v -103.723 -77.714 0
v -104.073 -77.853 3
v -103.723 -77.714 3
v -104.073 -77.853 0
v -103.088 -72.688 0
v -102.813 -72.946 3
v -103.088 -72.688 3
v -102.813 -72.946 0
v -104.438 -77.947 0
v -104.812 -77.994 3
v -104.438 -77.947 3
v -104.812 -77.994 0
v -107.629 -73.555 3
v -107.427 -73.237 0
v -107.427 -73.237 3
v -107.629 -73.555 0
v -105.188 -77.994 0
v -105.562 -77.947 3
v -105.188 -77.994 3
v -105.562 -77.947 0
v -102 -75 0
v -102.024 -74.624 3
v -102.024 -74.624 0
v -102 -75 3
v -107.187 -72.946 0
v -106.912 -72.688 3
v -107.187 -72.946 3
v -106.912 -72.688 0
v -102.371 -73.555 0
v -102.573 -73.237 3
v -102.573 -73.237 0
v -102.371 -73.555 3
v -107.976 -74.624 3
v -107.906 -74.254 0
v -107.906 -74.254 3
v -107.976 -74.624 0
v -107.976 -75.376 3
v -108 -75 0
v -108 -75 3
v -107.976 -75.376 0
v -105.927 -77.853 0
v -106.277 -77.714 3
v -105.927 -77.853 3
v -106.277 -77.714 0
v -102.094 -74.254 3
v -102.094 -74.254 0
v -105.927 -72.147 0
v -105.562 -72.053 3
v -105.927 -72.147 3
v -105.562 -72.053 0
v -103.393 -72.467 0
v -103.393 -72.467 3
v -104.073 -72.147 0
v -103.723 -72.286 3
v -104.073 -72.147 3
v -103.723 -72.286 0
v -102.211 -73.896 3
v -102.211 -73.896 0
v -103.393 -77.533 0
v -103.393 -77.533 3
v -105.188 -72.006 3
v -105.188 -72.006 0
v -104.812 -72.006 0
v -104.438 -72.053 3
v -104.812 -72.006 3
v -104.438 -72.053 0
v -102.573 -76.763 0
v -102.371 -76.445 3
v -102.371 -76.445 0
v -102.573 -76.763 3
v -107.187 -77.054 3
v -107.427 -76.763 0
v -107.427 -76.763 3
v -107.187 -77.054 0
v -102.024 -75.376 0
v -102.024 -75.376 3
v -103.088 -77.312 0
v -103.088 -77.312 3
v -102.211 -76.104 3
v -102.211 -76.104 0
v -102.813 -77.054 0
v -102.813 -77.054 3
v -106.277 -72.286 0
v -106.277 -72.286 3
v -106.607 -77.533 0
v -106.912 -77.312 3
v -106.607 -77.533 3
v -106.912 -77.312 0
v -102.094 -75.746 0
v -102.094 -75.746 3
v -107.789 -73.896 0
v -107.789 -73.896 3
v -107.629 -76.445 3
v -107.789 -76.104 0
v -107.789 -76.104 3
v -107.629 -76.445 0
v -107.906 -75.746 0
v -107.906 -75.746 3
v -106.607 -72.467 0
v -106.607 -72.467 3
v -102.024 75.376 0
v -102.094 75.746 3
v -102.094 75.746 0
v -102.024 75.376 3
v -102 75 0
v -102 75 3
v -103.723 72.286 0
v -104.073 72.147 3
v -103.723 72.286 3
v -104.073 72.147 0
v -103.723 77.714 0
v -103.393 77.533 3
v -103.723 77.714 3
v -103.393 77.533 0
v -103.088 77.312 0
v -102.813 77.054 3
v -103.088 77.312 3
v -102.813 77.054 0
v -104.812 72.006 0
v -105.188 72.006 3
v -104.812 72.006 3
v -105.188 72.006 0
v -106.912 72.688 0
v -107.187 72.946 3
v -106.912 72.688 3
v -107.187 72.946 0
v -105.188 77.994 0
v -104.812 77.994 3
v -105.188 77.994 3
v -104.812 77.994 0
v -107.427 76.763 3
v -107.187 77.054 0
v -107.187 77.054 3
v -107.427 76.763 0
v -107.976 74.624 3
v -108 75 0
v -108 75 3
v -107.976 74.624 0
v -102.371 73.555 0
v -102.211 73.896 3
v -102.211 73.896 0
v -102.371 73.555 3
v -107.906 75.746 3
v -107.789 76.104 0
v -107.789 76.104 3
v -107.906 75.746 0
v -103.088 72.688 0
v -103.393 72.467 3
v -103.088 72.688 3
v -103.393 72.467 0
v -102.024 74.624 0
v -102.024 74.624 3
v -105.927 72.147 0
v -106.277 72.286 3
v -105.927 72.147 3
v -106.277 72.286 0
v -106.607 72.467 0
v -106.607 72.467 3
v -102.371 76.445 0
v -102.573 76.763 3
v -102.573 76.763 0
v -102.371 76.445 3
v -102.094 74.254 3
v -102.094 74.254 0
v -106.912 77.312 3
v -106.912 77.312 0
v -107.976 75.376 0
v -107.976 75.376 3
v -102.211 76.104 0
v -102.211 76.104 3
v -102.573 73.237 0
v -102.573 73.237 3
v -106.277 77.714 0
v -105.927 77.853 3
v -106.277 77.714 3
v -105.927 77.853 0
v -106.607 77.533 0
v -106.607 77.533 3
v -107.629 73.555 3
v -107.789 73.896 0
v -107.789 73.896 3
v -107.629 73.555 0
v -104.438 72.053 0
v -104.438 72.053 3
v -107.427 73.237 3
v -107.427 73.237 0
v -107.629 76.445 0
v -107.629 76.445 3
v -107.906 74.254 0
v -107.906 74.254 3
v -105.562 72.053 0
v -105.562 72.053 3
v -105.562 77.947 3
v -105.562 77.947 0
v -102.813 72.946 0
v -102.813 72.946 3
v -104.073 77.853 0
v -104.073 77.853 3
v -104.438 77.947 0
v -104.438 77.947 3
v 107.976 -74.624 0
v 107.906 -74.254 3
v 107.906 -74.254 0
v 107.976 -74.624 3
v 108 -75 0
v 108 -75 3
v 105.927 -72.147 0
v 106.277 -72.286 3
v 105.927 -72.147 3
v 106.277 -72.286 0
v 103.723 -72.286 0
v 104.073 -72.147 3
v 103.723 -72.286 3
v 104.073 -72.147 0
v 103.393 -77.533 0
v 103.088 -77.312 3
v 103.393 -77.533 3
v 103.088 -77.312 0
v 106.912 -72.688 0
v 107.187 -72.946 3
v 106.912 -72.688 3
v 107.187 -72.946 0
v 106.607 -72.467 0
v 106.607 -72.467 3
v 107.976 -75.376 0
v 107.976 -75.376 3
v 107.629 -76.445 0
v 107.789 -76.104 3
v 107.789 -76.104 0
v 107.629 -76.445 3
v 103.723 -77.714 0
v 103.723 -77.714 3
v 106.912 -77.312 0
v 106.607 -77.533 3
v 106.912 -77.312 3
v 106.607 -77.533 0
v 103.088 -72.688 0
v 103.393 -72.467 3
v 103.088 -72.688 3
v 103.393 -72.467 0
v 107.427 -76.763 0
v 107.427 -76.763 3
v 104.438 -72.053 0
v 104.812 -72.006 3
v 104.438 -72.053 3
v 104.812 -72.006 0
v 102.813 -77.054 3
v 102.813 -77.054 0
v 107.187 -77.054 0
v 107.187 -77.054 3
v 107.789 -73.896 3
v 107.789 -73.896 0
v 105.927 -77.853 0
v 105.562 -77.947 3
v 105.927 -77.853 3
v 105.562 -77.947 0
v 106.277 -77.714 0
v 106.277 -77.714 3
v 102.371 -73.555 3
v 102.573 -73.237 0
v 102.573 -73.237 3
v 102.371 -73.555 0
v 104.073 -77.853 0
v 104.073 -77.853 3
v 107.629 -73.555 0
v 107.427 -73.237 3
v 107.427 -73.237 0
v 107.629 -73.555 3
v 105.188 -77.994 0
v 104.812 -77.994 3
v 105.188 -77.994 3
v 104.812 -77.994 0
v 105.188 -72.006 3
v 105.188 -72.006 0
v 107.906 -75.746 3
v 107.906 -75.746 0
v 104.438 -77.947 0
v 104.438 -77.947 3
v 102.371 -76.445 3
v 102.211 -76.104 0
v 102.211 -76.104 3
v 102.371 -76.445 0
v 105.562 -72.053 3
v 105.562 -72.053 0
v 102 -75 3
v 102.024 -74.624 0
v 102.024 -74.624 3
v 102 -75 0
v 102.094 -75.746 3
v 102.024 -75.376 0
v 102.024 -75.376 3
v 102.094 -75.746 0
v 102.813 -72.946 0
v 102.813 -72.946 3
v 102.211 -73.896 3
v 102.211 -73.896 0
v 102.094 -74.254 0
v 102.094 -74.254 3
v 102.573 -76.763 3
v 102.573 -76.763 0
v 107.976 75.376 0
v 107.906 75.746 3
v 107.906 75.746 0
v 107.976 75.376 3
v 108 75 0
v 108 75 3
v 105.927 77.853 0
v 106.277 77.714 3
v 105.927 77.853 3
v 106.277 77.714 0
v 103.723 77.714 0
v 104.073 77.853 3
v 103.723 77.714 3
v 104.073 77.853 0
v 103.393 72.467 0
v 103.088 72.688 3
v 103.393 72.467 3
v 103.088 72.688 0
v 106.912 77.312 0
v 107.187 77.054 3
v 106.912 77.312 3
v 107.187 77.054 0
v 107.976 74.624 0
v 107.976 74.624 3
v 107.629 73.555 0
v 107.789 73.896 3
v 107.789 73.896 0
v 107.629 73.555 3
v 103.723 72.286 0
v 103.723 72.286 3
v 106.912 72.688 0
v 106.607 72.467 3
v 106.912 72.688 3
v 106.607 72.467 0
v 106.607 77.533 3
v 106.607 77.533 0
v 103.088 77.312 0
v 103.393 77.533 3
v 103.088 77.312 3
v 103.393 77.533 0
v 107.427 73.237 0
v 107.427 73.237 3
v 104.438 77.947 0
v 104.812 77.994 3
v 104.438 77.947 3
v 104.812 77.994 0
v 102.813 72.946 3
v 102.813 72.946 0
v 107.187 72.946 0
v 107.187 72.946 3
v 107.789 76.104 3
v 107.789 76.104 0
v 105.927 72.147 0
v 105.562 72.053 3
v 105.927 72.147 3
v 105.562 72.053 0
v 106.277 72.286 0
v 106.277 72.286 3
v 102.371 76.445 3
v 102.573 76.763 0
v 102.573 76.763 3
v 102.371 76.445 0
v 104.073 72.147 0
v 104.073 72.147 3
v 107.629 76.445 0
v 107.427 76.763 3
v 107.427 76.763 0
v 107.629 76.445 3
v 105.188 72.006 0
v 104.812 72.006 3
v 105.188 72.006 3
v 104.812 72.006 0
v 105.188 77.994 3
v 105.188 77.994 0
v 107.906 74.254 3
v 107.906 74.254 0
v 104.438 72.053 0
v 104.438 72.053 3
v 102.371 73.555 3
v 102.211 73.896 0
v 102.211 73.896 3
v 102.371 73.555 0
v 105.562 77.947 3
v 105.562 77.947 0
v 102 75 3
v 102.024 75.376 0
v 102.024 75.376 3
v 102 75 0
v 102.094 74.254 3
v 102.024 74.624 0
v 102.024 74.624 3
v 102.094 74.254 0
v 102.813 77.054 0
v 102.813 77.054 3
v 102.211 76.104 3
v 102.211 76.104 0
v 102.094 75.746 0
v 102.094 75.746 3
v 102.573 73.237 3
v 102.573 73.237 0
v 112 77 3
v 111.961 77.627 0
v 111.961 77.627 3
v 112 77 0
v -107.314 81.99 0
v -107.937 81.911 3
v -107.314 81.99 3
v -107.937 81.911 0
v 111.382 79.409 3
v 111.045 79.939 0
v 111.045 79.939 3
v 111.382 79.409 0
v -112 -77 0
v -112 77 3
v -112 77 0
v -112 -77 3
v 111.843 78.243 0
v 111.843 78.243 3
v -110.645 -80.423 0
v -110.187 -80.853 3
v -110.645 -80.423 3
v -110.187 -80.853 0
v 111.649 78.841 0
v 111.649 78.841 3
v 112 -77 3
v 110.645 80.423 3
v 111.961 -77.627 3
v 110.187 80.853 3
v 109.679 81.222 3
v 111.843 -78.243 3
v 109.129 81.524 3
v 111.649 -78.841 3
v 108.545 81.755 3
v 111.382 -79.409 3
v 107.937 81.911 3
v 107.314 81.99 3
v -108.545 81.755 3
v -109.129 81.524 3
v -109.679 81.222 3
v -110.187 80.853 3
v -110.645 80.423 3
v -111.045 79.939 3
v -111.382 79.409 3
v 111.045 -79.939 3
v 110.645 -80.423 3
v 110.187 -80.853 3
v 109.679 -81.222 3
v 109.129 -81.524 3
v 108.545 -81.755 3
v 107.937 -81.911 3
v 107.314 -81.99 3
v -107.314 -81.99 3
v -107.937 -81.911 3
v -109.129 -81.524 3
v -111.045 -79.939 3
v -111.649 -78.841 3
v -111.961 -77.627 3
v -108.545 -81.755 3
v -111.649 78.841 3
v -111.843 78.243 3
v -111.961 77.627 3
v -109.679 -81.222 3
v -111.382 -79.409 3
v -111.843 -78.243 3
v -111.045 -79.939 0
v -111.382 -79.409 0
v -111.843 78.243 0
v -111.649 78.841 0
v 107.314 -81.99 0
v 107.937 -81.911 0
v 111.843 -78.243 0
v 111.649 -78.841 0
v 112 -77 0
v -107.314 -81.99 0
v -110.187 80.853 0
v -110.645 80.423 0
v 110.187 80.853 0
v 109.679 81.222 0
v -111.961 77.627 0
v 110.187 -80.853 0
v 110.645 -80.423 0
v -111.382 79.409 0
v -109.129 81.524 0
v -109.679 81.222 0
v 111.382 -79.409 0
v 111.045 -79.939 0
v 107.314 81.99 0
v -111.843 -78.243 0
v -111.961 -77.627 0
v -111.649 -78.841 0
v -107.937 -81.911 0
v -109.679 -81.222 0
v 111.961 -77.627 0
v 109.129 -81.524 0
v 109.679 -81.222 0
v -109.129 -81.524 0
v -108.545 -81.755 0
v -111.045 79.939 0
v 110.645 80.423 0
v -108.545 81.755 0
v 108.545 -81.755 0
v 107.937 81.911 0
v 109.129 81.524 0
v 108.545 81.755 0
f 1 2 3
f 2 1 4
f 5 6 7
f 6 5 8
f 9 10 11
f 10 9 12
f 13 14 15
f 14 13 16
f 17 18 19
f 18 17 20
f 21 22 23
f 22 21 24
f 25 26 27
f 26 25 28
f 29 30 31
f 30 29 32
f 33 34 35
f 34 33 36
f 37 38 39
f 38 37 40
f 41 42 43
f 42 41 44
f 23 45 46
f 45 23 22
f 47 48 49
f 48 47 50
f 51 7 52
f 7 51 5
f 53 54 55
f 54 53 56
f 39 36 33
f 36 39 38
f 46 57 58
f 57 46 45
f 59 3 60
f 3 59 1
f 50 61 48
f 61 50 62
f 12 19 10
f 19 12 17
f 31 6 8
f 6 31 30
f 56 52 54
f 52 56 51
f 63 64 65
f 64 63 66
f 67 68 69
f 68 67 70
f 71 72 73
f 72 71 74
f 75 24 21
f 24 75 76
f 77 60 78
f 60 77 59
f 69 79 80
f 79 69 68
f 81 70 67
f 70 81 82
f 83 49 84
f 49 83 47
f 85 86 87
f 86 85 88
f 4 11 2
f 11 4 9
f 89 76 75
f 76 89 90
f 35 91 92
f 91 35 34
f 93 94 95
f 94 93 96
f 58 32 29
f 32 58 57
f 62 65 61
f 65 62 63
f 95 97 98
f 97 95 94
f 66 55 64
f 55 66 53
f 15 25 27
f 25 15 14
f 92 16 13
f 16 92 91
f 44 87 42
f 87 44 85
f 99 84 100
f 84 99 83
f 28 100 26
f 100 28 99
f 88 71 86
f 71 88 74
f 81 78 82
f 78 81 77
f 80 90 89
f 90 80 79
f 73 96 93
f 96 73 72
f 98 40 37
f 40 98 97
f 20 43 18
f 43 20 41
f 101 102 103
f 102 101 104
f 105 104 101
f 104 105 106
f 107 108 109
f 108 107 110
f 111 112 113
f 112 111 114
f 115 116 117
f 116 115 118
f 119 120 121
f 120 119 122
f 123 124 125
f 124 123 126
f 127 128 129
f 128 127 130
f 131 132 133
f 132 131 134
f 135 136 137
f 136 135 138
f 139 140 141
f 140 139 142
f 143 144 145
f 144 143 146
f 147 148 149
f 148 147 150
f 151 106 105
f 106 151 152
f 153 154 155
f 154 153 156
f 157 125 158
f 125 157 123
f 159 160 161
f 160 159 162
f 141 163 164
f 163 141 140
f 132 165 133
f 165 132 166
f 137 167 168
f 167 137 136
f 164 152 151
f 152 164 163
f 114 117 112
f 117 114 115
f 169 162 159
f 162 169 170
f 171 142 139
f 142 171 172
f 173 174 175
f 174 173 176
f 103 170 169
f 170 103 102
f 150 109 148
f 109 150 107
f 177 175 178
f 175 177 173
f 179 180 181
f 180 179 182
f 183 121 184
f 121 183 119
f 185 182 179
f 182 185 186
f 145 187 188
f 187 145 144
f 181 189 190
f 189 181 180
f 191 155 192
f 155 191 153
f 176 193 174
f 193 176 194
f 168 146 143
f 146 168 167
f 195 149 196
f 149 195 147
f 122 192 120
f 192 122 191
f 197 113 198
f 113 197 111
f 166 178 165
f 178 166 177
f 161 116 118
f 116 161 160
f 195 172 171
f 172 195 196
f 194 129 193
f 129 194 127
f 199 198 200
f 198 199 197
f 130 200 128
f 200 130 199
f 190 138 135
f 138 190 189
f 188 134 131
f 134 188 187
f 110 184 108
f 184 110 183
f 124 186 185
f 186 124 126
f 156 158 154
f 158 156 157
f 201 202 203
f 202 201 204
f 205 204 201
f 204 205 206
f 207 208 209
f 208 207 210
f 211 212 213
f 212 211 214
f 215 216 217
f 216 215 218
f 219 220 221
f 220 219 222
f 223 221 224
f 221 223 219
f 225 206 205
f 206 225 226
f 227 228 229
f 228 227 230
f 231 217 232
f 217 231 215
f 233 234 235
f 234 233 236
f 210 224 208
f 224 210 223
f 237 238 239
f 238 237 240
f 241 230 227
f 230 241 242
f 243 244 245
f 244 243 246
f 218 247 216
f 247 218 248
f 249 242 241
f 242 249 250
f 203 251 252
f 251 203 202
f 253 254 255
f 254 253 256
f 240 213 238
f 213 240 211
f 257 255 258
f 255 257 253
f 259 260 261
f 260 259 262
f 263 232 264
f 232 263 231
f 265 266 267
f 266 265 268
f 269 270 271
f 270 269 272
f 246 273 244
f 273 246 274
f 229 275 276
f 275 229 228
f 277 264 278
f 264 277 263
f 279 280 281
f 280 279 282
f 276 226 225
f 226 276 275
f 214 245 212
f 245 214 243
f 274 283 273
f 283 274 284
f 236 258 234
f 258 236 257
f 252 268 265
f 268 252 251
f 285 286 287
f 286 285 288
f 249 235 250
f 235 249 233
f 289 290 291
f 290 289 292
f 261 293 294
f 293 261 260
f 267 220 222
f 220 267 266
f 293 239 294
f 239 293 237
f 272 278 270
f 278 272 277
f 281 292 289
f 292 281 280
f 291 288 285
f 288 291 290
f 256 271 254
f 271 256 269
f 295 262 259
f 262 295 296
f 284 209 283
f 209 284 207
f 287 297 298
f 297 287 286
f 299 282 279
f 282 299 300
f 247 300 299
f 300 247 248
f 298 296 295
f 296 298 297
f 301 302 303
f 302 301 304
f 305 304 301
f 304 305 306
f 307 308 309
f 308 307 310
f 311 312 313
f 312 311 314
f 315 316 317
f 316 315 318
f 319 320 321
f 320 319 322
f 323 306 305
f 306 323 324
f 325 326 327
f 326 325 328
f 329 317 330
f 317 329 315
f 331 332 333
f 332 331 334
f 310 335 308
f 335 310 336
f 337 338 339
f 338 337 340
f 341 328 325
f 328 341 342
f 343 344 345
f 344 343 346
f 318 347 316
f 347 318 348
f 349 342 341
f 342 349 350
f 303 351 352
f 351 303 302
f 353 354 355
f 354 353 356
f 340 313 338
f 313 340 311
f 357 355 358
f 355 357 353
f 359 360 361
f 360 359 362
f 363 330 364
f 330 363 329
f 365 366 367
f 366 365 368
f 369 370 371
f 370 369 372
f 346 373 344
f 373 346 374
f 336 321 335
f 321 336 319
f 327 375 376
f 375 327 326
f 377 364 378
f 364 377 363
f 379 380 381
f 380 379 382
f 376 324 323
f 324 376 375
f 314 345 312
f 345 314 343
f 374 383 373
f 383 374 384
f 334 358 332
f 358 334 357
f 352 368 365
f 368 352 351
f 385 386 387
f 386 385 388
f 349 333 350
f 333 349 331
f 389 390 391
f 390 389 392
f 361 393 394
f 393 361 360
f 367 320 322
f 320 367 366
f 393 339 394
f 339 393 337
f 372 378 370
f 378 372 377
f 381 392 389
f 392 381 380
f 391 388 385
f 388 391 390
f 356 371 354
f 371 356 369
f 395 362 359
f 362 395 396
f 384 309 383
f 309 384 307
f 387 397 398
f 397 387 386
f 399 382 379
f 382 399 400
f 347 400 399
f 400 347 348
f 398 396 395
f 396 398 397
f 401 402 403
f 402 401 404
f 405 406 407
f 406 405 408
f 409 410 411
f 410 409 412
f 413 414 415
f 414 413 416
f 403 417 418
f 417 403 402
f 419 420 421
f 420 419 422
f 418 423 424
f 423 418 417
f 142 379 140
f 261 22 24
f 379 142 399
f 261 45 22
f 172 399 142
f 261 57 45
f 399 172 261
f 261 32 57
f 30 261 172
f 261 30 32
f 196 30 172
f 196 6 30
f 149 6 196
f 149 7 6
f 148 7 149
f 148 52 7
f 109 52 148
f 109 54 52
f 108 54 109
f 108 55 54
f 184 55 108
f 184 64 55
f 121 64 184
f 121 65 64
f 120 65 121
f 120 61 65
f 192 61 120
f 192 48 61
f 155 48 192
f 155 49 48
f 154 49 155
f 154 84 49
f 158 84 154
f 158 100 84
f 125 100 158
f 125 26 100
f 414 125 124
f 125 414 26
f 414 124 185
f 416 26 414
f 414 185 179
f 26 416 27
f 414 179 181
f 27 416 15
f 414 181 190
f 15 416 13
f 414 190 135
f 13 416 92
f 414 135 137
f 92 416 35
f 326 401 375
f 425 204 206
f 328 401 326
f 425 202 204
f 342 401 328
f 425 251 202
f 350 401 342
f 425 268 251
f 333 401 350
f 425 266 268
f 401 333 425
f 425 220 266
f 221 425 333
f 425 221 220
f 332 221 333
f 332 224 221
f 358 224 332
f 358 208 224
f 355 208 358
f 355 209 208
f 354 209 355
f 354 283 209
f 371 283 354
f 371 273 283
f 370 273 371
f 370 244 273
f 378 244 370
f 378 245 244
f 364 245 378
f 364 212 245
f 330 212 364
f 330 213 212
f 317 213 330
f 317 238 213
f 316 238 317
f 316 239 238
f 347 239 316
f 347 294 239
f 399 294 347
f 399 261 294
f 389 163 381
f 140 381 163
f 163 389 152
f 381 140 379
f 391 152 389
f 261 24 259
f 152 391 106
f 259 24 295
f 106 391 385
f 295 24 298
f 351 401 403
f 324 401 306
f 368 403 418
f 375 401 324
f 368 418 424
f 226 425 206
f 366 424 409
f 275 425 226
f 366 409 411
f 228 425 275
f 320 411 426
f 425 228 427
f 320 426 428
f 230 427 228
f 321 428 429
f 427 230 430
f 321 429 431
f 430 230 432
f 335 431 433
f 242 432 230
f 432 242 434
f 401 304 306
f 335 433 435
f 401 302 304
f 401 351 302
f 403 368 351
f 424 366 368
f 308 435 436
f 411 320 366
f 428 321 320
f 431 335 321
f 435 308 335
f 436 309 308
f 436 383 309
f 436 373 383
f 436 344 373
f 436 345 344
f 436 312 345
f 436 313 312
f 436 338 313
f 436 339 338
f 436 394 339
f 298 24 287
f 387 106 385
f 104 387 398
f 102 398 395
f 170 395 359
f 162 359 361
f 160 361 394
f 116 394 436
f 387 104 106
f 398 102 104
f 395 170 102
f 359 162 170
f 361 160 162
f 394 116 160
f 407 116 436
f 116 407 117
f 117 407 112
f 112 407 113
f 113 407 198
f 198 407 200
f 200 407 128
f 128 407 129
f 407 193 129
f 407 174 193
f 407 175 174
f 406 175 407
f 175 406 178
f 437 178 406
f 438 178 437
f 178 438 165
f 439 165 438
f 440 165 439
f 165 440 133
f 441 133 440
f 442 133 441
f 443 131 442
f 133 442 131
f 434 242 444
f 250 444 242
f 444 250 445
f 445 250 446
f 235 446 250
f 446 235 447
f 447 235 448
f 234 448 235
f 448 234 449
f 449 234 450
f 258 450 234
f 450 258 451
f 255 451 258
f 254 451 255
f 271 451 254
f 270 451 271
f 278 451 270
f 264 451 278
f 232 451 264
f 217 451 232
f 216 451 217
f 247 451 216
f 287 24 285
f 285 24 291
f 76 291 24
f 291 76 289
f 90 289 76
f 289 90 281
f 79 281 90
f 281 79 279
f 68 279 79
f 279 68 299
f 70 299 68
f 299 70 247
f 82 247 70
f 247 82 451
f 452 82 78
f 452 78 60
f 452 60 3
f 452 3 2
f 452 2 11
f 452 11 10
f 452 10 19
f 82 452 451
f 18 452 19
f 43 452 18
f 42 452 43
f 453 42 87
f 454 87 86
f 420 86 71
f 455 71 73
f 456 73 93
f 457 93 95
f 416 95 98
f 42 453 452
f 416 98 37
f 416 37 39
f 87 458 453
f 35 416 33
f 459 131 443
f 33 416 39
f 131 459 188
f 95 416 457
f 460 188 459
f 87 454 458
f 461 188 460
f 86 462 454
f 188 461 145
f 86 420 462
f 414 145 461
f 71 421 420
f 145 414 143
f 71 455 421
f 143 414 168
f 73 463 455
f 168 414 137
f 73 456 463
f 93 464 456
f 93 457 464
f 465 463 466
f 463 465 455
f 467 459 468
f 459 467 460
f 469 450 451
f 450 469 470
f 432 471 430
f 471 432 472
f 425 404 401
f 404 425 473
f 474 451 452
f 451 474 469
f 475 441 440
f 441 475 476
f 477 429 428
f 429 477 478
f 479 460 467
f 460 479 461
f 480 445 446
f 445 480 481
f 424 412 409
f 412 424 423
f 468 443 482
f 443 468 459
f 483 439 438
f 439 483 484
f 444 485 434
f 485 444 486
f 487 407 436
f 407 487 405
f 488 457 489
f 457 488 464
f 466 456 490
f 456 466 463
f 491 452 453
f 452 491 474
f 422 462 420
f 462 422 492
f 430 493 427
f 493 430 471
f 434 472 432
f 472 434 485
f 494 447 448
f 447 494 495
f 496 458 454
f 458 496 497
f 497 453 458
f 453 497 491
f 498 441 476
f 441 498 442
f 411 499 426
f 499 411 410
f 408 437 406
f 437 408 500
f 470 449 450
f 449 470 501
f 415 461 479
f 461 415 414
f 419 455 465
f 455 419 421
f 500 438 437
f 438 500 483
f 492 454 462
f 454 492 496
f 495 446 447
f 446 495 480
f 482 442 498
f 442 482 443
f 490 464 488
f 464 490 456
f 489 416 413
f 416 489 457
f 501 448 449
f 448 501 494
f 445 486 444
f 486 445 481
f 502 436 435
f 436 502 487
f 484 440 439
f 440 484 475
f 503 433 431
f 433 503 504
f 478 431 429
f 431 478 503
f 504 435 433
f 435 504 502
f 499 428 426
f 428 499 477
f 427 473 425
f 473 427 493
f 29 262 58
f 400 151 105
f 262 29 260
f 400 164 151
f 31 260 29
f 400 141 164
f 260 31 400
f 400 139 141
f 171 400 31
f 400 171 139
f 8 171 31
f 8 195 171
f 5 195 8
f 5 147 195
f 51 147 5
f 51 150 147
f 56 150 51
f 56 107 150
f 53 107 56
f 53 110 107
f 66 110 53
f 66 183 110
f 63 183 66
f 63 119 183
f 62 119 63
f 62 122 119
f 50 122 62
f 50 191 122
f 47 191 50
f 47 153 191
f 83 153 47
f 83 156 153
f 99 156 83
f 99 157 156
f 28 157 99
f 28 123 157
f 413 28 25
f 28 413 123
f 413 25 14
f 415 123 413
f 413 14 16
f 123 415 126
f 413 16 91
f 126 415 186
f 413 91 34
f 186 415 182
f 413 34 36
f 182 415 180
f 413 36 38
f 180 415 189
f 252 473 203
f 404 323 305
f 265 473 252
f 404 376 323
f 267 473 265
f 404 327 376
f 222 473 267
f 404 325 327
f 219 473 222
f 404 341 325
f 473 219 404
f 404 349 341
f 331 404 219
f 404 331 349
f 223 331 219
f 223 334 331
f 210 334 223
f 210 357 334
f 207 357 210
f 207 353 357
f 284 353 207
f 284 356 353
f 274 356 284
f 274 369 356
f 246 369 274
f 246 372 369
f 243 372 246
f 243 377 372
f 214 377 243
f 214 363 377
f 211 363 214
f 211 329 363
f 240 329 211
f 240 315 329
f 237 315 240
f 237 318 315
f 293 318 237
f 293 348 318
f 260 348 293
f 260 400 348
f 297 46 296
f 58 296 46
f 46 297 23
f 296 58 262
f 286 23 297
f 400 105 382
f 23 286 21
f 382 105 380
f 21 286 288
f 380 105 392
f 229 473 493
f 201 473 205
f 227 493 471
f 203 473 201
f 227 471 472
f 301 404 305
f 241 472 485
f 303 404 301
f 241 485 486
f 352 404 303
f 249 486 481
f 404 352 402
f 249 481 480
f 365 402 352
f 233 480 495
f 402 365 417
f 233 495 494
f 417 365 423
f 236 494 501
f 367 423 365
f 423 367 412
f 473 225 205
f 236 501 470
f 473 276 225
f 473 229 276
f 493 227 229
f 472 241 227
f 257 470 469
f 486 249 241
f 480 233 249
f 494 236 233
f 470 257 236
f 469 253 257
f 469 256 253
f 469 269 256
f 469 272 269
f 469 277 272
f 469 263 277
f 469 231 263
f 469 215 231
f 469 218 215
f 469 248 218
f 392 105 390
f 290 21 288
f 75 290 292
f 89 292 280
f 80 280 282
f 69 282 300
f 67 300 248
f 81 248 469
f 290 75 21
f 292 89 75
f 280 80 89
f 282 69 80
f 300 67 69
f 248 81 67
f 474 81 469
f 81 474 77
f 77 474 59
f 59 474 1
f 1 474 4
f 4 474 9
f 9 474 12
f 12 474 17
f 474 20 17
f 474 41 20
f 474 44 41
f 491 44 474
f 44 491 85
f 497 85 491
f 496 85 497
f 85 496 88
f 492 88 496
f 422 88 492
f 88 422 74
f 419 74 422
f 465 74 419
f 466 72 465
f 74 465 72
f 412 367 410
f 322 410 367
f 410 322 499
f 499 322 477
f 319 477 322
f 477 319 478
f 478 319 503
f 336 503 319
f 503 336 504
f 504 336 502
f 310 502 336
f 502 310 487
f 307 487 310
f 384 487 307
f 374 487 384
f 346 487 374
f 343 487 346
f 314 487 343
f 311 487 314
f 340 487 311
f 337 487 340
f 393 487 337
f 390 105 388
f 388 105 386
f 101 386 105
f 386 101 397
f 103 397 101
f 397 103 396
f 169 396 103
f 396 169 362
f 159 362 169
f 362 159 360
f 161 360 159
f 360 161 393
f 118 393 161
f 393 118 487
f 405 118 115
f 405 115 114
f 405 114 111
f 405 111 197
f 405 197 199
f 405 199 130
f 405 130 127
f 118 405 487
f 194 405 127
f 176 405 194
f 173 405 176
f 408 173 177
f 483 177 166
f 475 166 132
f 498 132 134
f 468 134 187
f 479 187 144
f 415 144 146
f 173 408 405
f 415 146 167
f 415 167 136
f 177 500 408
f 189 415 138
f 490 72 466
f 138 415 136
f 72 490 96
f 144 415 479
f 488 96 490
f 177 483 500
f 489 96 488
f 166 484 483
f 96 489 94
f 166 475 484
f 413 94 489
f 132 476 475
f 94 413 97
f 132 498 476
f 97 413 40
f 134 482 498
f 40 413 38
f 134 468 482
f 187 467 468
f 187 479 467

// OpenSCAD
$fn = 50;


difference() {
	union() {
		hull() {
			translate(v = [-107.0000000000, 77.0000000000, 0]) {
				cylinder(h = 3, r = 5);
			}
			translate(v = [107.0000000000, 77.0000000000, 0]) {
				cylinder(h = 3, r = 5);
			}
			translate(v = [-107.0000000000, -77.0000000000, 0]) {
				cylinder(h = 3, r = 5);
			}
			translate(v = [107.0000000000, -77.0000000000, 0]) {
				cylinder(h = 3, r = 5);
			}
		}
	}
	union() {
		translate(v = [-105.0000000000, -75.0000000000, -100.0000000000]) {
			cylinder(h = 200, r = 3.0000000000);
		}
		translate(v = [-105.0000000000, 75.0000000000, -100.0000000000]) {
			cylinder(h = 200, r = 3.0000000000);
		}
		translate(v = [105.0000000000, -75.0000000000, -100.0000000000]) {
			cylinder(h = 200, r = 3.0000000000);
		}
		translate(v = [105.0000000000, 75.0000000000, -100.0000000000]) {
			cylinder(h = 200, r = 3.0000000000);
		}
	}
}
